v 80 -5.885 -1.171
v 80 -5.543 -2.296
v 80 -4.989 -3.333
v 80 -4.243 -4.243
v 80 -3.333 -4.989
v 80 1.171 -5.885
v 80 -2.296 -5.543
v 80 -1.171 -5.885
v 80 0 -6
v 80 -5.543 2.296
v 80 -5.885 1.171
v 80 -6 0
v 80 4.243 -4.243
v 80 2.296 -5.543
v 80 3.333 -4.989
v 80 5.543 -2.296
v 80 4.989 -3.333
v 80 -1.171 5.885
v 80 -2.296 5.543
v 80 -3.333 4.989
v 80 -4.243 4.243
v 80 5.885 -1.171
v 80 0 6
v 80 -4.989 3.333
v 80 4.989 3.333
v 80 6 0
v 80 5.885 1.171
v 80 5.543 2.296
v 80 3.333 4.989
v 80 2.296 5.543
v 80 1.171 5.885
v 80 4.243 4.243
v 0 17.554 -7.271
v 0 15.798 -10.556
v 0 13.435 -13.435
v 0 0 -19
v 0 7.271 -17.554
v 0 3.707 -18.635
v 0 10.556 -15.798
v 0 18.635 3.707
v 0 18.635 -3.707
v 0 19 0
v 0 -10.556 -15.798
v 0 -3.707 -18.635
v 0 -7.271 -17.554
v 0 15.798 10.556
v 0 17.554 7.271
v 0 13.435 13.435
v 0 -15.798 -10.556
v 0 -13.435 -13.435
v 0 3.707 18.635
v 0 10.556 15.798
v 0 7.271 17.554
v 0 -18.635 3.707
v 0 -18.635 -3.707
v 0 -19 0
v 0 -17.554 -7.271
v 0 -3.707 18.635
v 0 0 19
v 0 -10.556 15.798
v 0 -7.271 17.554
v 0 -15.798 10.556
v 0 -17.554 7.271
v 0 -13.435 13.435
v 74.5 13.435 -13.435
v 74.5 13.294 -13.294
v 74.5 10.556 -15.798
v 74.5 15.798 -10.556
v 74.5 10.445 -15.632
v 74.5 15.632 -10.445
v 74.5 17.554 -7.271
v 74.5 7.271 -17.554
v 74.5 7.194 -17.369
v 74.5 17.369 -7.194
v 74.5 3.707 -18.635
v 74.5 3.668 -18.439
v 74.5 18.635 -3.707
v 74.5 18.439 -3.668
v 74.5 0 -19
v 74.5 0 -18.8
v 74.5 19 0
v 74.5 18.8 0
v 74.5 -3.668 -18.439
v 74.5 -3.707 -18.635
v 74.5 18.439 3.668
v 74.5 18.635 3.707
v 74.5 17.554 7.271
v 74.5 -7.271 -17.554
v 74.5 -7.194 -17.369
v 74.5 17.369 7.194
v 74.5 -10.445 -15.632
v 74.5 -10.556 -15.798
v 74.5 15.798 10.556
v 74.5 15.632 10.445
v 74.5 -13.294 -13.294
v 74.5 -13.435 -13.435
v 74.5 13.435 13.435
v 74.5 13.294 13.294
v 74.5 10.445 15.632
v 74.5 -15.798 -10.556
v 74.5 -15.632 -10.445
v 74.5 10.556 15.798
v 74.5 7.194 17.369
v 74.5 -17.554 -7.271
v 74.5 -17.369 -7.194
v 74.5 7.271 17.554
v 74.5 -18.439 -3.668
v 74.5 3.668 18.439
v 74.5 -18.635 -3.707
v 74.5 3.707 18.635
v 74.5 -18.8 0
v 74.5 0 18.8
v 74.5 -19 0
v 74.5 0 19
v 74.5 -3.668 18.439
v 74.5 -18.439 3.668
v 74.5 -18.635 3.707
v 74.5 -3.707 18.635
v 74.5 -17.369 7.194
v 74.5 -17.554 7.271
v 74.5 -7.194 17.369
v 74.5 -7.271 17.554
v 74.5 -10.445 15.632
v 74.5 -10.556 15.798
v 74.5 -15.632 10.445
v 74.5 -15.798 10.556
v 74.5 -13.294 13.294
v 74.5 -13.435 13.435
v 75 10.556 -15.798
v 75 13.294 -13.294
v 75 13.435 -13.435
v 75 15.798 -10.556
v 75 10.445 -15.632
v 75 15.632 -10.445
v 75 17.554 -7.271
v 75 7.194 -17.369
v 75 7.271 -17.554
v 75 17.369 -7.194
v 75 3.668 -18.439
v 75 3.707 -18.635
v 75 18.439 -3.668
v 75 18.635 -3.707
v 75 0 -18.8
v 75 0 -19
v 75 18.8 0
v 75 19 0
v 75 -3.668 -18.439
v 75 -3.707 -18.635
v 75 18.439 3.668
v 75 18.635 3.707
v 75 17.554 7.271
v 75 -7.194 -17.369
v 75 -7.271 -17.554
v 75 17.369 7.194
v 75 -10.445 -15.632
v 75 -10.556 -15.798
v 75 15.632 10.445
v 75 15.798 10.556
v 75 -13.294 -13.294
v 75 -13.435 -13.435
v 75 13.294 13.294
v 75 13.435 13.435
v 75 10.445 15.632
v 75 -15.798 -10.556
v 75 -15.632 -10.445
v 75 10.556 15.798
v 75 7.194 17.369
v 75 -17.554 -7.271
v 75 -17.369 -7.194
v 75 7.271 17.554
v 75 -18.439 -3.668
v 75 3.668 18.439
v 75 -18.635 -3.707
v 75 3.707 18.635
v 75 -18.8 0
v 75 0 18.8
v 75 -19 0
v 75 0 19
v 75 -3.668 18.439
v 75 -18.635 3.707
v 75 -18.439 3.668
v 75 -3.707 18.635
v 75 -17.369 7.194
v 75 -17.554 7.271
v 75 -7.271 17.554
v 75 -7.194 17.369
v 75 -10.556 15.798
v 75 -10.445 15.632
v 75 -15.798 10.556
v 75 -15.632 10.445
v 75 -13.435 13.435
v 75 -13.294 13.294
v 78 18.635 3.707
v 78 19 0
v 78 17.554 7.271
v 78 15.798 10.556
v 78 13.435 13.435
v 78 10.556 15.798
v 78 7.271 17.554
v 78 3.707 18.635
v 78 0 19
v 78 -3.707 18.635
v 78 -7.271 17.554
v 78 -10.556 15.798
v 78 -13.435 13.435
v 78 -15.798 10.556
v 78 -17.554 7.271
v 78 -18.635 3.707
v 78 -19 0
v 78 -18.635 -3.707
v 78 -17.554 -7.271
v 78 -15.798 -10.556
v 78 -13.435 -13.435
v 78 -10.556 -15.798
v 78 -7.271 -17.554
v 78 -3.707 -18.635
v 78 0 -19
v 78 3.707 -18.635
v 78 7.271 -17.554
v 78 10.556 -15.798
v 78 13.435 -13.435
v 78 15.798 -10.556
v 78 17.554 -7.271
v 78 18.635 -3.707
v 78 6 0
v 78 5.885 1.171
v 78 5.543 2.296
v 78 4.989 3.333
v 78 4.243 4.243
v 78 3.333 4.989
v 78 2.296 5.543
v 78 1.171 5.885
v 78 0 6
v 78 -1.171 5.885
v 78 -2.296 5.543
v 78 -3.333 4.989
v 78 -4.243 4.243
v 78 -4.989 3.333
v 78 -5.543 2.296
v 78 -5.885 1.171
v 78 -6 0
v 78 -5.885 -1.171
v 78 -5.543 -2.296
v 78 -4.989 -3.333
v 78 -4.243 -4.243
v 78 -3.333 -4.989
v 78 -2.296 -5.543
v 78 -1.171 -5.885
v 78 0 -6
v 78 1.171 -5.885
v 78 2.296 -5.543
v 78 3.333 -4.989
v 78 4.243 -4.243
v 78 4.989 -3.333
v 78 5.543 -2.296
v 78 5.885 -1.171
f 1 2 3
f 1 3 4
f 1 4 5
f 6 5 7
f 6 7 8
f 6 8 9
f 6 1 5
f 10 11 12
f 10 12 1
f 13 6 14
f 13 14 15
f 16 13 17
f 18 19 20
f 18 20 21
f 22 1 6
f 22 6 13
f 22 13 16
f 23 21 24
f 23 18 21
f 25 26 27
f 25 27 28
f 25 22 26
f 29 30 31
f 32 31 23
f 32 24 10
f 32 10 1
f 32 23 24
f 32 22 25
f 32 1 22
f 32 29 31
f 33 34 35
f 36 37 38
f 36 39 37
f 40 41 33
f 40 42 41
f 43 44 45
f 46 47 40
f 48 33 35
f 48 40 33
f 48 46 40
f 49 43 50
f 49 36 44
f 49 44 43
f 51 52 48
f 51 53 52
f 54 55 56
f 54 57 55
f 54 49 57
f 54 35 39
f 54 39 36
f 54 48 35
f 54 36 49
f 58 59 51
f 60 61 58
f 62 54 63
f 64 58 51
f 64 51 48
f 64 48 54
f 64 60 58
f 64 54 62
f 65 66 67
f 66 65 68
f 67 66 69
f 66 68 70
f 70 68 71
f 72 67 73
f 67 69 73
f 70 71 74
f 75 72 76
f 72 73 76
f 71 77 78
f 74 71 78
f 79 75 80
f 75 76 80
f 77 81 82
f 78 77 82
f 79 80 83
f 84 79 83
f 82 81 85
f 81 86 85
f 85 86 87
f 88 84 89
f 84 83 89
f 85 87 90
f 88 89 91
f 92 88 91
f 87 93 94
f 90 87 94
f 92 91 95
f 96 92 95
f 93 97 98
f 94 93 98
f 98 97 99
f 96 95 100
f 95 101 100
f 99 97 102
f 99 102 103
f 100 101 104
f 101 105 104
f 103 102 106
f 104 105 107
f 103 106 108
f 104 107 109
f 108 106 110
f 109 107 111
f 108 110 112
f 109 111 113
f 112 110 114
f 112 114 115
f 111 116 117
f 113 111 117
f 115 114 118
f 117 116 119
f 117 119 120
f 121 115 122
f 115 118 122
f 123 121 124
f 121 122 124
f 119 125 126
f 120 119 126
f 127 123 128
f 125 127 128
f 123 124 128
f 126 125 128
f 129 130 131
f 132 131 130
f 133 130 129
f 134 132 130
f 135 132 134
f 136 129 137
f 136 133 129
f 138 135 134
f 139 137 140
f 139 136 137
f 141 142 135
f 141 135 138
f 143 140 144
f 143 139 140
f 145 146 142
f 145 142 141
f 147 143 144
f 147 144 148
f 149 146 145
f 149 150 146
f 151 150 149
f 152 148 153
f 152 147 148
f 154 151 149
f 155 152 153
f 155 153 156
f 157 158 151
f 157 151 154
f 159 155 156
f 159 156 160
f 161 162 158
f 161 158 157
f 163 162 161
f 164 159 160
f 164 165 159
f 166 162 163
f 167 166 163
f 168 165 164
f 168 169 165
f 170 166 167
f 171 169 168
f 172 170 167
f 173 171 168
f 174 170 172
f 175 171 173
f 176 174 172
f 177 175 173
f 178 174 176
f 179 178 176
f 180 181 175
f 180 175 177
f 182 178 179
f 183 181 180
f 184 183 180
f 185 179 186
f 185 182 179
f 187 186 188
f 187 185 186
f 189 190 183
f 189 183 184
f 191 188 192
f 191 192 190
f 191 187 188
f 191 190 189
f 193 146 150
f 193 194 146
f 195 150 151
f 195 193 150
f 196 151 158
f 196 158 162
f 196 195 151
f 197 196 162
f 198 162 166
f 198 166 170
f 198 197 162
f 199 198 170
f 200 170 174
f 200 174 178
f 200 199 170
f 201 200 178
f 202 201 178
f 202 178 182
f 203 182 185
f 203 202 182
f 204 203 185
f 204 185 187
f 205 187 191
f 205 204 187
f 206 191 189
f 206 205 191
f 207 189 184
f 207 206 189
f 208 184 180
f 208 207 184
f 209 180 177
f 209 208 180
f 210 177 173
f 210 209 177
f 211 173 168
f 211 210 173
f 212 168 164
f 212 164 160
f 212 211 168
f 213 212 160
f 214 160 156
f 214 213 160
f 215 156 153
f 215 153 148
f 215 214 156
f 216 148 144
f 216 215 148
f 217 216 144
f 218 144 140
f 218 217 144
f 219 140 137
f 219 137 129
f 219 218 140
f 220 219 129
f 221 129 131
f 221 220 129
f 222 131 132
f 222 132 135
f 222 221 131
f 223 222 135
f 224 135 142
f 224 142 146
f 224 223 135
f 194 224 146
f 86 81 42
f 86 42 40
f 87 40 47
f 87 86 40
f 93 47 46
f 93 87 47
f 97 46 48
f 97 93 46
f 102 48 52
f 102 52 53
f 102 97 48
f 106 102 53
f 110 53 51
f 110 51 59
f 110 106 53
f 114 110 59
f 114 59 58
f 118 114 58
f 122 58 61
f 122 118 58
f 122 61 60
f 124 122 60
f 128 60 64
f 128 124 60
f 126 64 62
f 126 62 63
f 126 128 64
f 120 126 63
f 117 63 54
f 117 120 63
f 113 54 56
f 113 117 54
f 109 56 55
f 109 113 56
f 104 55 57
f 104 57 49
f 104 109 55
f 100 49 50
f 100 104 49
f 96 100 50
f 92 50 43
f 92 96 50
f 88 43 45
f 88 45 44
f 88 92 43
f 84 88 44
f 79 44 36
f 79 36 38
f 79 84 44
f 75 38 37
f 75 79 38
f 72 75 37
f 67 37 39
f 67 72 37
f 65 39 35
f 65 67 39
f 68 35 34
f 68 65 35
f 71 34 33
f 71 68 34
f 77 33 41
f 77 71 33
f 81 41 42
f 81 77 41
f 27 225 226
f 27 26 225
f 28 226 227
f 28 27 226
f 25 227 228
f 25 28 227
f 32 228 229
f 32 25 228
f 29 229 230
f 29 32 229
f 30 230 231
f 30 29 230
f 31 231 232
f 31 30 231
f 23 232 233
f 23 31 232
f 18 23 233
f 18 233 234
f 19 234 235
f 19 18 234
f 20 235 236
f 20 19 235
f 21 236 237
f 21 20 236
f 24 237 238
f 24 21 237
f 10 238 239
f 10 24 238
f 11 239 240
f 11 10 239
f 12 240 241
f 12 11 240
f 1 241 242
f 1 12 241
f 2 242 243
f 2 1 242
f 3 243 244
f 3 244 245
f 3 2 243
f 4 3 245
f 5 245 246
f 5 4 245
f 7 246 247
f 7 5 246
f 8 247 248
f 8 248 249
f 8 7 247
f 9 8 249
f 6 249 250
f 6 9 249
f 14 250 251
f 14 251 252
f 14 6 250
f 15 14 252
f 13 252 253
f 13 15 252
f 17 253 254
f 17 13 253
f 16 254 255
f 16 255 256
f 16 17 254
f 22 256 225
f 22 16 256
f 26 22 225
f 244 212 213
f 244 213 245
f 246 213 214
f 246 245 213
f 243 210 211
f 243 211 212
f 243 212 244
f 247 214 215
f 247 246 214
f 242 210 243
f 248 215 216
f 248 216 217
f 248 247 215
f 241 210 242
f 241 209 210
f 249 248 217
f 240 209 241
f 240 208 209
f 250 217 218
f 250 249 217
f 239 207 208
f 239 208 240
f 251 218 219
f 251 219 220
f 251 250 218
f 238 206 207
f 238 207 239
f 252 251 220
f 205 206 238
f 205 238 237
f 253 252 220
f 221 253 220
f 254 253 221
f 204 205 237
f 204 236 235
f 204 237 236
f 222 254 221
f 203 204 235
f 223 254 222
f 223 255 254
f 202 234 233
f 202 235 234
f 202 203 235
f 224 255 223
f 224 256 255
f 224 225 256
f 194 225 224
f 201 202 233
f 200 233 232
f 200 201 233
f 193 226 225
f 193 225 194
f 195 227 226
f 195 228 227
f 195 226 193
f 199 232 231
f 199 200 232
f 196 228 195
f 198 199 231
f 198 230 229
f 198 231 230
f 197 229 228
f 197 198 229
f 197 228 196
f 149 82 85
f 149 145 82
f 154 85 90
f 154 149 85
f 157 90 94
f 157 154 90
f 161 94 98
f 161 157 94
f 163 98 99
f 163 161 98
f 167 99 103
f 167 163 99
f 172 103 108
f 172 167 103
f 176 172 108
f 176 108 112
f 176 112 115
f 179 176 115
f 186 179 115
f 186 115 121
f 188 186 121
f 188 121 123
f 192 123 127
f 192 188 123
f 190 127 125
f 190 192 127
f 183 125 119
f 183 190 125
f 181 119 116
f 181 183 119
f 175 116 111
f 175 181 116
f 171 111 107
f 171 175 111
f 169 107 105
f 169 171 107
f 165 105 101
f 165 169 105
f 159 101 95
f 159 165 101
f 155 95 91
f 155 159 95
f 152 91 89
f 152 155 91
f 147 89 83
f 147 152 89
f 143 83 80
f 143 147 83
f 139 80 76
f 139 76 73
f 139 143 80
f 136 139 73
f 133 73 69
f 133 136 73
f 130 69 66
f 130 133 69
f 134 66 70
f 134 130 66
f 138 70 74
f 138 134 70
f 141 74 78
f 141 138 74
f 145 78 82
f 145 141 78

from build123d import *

# Parameters (mm, degrees)
SKIZZE2_W = 0.5
SKIZZE2_H = 0.2


with BuildPart() as part:
    # Skizze1 → Rotation1 (revolve)
    with BuildSketch(Plane.XY):
        Polygon((0, 0), (0, 19), (78, 19), (78, 6), (80, 6), (80, 0), align=None)
    revolve(axis=Axis((0, 0, 0), (1, 0, 0)))

    # Skizze2 → Schnitt-Rotation1 (revolve, cut)
    with BuildSketch(Plane.XY):
        with Locations((74.75, 18.9)):
            Rectangle(SKIZZE2_W, SKIZZE2_H)
    revolve(axis=Axis((0, 0, 0), (1, 0, 0)), mode=Mode.SUBTRACT)


solid = part.part
